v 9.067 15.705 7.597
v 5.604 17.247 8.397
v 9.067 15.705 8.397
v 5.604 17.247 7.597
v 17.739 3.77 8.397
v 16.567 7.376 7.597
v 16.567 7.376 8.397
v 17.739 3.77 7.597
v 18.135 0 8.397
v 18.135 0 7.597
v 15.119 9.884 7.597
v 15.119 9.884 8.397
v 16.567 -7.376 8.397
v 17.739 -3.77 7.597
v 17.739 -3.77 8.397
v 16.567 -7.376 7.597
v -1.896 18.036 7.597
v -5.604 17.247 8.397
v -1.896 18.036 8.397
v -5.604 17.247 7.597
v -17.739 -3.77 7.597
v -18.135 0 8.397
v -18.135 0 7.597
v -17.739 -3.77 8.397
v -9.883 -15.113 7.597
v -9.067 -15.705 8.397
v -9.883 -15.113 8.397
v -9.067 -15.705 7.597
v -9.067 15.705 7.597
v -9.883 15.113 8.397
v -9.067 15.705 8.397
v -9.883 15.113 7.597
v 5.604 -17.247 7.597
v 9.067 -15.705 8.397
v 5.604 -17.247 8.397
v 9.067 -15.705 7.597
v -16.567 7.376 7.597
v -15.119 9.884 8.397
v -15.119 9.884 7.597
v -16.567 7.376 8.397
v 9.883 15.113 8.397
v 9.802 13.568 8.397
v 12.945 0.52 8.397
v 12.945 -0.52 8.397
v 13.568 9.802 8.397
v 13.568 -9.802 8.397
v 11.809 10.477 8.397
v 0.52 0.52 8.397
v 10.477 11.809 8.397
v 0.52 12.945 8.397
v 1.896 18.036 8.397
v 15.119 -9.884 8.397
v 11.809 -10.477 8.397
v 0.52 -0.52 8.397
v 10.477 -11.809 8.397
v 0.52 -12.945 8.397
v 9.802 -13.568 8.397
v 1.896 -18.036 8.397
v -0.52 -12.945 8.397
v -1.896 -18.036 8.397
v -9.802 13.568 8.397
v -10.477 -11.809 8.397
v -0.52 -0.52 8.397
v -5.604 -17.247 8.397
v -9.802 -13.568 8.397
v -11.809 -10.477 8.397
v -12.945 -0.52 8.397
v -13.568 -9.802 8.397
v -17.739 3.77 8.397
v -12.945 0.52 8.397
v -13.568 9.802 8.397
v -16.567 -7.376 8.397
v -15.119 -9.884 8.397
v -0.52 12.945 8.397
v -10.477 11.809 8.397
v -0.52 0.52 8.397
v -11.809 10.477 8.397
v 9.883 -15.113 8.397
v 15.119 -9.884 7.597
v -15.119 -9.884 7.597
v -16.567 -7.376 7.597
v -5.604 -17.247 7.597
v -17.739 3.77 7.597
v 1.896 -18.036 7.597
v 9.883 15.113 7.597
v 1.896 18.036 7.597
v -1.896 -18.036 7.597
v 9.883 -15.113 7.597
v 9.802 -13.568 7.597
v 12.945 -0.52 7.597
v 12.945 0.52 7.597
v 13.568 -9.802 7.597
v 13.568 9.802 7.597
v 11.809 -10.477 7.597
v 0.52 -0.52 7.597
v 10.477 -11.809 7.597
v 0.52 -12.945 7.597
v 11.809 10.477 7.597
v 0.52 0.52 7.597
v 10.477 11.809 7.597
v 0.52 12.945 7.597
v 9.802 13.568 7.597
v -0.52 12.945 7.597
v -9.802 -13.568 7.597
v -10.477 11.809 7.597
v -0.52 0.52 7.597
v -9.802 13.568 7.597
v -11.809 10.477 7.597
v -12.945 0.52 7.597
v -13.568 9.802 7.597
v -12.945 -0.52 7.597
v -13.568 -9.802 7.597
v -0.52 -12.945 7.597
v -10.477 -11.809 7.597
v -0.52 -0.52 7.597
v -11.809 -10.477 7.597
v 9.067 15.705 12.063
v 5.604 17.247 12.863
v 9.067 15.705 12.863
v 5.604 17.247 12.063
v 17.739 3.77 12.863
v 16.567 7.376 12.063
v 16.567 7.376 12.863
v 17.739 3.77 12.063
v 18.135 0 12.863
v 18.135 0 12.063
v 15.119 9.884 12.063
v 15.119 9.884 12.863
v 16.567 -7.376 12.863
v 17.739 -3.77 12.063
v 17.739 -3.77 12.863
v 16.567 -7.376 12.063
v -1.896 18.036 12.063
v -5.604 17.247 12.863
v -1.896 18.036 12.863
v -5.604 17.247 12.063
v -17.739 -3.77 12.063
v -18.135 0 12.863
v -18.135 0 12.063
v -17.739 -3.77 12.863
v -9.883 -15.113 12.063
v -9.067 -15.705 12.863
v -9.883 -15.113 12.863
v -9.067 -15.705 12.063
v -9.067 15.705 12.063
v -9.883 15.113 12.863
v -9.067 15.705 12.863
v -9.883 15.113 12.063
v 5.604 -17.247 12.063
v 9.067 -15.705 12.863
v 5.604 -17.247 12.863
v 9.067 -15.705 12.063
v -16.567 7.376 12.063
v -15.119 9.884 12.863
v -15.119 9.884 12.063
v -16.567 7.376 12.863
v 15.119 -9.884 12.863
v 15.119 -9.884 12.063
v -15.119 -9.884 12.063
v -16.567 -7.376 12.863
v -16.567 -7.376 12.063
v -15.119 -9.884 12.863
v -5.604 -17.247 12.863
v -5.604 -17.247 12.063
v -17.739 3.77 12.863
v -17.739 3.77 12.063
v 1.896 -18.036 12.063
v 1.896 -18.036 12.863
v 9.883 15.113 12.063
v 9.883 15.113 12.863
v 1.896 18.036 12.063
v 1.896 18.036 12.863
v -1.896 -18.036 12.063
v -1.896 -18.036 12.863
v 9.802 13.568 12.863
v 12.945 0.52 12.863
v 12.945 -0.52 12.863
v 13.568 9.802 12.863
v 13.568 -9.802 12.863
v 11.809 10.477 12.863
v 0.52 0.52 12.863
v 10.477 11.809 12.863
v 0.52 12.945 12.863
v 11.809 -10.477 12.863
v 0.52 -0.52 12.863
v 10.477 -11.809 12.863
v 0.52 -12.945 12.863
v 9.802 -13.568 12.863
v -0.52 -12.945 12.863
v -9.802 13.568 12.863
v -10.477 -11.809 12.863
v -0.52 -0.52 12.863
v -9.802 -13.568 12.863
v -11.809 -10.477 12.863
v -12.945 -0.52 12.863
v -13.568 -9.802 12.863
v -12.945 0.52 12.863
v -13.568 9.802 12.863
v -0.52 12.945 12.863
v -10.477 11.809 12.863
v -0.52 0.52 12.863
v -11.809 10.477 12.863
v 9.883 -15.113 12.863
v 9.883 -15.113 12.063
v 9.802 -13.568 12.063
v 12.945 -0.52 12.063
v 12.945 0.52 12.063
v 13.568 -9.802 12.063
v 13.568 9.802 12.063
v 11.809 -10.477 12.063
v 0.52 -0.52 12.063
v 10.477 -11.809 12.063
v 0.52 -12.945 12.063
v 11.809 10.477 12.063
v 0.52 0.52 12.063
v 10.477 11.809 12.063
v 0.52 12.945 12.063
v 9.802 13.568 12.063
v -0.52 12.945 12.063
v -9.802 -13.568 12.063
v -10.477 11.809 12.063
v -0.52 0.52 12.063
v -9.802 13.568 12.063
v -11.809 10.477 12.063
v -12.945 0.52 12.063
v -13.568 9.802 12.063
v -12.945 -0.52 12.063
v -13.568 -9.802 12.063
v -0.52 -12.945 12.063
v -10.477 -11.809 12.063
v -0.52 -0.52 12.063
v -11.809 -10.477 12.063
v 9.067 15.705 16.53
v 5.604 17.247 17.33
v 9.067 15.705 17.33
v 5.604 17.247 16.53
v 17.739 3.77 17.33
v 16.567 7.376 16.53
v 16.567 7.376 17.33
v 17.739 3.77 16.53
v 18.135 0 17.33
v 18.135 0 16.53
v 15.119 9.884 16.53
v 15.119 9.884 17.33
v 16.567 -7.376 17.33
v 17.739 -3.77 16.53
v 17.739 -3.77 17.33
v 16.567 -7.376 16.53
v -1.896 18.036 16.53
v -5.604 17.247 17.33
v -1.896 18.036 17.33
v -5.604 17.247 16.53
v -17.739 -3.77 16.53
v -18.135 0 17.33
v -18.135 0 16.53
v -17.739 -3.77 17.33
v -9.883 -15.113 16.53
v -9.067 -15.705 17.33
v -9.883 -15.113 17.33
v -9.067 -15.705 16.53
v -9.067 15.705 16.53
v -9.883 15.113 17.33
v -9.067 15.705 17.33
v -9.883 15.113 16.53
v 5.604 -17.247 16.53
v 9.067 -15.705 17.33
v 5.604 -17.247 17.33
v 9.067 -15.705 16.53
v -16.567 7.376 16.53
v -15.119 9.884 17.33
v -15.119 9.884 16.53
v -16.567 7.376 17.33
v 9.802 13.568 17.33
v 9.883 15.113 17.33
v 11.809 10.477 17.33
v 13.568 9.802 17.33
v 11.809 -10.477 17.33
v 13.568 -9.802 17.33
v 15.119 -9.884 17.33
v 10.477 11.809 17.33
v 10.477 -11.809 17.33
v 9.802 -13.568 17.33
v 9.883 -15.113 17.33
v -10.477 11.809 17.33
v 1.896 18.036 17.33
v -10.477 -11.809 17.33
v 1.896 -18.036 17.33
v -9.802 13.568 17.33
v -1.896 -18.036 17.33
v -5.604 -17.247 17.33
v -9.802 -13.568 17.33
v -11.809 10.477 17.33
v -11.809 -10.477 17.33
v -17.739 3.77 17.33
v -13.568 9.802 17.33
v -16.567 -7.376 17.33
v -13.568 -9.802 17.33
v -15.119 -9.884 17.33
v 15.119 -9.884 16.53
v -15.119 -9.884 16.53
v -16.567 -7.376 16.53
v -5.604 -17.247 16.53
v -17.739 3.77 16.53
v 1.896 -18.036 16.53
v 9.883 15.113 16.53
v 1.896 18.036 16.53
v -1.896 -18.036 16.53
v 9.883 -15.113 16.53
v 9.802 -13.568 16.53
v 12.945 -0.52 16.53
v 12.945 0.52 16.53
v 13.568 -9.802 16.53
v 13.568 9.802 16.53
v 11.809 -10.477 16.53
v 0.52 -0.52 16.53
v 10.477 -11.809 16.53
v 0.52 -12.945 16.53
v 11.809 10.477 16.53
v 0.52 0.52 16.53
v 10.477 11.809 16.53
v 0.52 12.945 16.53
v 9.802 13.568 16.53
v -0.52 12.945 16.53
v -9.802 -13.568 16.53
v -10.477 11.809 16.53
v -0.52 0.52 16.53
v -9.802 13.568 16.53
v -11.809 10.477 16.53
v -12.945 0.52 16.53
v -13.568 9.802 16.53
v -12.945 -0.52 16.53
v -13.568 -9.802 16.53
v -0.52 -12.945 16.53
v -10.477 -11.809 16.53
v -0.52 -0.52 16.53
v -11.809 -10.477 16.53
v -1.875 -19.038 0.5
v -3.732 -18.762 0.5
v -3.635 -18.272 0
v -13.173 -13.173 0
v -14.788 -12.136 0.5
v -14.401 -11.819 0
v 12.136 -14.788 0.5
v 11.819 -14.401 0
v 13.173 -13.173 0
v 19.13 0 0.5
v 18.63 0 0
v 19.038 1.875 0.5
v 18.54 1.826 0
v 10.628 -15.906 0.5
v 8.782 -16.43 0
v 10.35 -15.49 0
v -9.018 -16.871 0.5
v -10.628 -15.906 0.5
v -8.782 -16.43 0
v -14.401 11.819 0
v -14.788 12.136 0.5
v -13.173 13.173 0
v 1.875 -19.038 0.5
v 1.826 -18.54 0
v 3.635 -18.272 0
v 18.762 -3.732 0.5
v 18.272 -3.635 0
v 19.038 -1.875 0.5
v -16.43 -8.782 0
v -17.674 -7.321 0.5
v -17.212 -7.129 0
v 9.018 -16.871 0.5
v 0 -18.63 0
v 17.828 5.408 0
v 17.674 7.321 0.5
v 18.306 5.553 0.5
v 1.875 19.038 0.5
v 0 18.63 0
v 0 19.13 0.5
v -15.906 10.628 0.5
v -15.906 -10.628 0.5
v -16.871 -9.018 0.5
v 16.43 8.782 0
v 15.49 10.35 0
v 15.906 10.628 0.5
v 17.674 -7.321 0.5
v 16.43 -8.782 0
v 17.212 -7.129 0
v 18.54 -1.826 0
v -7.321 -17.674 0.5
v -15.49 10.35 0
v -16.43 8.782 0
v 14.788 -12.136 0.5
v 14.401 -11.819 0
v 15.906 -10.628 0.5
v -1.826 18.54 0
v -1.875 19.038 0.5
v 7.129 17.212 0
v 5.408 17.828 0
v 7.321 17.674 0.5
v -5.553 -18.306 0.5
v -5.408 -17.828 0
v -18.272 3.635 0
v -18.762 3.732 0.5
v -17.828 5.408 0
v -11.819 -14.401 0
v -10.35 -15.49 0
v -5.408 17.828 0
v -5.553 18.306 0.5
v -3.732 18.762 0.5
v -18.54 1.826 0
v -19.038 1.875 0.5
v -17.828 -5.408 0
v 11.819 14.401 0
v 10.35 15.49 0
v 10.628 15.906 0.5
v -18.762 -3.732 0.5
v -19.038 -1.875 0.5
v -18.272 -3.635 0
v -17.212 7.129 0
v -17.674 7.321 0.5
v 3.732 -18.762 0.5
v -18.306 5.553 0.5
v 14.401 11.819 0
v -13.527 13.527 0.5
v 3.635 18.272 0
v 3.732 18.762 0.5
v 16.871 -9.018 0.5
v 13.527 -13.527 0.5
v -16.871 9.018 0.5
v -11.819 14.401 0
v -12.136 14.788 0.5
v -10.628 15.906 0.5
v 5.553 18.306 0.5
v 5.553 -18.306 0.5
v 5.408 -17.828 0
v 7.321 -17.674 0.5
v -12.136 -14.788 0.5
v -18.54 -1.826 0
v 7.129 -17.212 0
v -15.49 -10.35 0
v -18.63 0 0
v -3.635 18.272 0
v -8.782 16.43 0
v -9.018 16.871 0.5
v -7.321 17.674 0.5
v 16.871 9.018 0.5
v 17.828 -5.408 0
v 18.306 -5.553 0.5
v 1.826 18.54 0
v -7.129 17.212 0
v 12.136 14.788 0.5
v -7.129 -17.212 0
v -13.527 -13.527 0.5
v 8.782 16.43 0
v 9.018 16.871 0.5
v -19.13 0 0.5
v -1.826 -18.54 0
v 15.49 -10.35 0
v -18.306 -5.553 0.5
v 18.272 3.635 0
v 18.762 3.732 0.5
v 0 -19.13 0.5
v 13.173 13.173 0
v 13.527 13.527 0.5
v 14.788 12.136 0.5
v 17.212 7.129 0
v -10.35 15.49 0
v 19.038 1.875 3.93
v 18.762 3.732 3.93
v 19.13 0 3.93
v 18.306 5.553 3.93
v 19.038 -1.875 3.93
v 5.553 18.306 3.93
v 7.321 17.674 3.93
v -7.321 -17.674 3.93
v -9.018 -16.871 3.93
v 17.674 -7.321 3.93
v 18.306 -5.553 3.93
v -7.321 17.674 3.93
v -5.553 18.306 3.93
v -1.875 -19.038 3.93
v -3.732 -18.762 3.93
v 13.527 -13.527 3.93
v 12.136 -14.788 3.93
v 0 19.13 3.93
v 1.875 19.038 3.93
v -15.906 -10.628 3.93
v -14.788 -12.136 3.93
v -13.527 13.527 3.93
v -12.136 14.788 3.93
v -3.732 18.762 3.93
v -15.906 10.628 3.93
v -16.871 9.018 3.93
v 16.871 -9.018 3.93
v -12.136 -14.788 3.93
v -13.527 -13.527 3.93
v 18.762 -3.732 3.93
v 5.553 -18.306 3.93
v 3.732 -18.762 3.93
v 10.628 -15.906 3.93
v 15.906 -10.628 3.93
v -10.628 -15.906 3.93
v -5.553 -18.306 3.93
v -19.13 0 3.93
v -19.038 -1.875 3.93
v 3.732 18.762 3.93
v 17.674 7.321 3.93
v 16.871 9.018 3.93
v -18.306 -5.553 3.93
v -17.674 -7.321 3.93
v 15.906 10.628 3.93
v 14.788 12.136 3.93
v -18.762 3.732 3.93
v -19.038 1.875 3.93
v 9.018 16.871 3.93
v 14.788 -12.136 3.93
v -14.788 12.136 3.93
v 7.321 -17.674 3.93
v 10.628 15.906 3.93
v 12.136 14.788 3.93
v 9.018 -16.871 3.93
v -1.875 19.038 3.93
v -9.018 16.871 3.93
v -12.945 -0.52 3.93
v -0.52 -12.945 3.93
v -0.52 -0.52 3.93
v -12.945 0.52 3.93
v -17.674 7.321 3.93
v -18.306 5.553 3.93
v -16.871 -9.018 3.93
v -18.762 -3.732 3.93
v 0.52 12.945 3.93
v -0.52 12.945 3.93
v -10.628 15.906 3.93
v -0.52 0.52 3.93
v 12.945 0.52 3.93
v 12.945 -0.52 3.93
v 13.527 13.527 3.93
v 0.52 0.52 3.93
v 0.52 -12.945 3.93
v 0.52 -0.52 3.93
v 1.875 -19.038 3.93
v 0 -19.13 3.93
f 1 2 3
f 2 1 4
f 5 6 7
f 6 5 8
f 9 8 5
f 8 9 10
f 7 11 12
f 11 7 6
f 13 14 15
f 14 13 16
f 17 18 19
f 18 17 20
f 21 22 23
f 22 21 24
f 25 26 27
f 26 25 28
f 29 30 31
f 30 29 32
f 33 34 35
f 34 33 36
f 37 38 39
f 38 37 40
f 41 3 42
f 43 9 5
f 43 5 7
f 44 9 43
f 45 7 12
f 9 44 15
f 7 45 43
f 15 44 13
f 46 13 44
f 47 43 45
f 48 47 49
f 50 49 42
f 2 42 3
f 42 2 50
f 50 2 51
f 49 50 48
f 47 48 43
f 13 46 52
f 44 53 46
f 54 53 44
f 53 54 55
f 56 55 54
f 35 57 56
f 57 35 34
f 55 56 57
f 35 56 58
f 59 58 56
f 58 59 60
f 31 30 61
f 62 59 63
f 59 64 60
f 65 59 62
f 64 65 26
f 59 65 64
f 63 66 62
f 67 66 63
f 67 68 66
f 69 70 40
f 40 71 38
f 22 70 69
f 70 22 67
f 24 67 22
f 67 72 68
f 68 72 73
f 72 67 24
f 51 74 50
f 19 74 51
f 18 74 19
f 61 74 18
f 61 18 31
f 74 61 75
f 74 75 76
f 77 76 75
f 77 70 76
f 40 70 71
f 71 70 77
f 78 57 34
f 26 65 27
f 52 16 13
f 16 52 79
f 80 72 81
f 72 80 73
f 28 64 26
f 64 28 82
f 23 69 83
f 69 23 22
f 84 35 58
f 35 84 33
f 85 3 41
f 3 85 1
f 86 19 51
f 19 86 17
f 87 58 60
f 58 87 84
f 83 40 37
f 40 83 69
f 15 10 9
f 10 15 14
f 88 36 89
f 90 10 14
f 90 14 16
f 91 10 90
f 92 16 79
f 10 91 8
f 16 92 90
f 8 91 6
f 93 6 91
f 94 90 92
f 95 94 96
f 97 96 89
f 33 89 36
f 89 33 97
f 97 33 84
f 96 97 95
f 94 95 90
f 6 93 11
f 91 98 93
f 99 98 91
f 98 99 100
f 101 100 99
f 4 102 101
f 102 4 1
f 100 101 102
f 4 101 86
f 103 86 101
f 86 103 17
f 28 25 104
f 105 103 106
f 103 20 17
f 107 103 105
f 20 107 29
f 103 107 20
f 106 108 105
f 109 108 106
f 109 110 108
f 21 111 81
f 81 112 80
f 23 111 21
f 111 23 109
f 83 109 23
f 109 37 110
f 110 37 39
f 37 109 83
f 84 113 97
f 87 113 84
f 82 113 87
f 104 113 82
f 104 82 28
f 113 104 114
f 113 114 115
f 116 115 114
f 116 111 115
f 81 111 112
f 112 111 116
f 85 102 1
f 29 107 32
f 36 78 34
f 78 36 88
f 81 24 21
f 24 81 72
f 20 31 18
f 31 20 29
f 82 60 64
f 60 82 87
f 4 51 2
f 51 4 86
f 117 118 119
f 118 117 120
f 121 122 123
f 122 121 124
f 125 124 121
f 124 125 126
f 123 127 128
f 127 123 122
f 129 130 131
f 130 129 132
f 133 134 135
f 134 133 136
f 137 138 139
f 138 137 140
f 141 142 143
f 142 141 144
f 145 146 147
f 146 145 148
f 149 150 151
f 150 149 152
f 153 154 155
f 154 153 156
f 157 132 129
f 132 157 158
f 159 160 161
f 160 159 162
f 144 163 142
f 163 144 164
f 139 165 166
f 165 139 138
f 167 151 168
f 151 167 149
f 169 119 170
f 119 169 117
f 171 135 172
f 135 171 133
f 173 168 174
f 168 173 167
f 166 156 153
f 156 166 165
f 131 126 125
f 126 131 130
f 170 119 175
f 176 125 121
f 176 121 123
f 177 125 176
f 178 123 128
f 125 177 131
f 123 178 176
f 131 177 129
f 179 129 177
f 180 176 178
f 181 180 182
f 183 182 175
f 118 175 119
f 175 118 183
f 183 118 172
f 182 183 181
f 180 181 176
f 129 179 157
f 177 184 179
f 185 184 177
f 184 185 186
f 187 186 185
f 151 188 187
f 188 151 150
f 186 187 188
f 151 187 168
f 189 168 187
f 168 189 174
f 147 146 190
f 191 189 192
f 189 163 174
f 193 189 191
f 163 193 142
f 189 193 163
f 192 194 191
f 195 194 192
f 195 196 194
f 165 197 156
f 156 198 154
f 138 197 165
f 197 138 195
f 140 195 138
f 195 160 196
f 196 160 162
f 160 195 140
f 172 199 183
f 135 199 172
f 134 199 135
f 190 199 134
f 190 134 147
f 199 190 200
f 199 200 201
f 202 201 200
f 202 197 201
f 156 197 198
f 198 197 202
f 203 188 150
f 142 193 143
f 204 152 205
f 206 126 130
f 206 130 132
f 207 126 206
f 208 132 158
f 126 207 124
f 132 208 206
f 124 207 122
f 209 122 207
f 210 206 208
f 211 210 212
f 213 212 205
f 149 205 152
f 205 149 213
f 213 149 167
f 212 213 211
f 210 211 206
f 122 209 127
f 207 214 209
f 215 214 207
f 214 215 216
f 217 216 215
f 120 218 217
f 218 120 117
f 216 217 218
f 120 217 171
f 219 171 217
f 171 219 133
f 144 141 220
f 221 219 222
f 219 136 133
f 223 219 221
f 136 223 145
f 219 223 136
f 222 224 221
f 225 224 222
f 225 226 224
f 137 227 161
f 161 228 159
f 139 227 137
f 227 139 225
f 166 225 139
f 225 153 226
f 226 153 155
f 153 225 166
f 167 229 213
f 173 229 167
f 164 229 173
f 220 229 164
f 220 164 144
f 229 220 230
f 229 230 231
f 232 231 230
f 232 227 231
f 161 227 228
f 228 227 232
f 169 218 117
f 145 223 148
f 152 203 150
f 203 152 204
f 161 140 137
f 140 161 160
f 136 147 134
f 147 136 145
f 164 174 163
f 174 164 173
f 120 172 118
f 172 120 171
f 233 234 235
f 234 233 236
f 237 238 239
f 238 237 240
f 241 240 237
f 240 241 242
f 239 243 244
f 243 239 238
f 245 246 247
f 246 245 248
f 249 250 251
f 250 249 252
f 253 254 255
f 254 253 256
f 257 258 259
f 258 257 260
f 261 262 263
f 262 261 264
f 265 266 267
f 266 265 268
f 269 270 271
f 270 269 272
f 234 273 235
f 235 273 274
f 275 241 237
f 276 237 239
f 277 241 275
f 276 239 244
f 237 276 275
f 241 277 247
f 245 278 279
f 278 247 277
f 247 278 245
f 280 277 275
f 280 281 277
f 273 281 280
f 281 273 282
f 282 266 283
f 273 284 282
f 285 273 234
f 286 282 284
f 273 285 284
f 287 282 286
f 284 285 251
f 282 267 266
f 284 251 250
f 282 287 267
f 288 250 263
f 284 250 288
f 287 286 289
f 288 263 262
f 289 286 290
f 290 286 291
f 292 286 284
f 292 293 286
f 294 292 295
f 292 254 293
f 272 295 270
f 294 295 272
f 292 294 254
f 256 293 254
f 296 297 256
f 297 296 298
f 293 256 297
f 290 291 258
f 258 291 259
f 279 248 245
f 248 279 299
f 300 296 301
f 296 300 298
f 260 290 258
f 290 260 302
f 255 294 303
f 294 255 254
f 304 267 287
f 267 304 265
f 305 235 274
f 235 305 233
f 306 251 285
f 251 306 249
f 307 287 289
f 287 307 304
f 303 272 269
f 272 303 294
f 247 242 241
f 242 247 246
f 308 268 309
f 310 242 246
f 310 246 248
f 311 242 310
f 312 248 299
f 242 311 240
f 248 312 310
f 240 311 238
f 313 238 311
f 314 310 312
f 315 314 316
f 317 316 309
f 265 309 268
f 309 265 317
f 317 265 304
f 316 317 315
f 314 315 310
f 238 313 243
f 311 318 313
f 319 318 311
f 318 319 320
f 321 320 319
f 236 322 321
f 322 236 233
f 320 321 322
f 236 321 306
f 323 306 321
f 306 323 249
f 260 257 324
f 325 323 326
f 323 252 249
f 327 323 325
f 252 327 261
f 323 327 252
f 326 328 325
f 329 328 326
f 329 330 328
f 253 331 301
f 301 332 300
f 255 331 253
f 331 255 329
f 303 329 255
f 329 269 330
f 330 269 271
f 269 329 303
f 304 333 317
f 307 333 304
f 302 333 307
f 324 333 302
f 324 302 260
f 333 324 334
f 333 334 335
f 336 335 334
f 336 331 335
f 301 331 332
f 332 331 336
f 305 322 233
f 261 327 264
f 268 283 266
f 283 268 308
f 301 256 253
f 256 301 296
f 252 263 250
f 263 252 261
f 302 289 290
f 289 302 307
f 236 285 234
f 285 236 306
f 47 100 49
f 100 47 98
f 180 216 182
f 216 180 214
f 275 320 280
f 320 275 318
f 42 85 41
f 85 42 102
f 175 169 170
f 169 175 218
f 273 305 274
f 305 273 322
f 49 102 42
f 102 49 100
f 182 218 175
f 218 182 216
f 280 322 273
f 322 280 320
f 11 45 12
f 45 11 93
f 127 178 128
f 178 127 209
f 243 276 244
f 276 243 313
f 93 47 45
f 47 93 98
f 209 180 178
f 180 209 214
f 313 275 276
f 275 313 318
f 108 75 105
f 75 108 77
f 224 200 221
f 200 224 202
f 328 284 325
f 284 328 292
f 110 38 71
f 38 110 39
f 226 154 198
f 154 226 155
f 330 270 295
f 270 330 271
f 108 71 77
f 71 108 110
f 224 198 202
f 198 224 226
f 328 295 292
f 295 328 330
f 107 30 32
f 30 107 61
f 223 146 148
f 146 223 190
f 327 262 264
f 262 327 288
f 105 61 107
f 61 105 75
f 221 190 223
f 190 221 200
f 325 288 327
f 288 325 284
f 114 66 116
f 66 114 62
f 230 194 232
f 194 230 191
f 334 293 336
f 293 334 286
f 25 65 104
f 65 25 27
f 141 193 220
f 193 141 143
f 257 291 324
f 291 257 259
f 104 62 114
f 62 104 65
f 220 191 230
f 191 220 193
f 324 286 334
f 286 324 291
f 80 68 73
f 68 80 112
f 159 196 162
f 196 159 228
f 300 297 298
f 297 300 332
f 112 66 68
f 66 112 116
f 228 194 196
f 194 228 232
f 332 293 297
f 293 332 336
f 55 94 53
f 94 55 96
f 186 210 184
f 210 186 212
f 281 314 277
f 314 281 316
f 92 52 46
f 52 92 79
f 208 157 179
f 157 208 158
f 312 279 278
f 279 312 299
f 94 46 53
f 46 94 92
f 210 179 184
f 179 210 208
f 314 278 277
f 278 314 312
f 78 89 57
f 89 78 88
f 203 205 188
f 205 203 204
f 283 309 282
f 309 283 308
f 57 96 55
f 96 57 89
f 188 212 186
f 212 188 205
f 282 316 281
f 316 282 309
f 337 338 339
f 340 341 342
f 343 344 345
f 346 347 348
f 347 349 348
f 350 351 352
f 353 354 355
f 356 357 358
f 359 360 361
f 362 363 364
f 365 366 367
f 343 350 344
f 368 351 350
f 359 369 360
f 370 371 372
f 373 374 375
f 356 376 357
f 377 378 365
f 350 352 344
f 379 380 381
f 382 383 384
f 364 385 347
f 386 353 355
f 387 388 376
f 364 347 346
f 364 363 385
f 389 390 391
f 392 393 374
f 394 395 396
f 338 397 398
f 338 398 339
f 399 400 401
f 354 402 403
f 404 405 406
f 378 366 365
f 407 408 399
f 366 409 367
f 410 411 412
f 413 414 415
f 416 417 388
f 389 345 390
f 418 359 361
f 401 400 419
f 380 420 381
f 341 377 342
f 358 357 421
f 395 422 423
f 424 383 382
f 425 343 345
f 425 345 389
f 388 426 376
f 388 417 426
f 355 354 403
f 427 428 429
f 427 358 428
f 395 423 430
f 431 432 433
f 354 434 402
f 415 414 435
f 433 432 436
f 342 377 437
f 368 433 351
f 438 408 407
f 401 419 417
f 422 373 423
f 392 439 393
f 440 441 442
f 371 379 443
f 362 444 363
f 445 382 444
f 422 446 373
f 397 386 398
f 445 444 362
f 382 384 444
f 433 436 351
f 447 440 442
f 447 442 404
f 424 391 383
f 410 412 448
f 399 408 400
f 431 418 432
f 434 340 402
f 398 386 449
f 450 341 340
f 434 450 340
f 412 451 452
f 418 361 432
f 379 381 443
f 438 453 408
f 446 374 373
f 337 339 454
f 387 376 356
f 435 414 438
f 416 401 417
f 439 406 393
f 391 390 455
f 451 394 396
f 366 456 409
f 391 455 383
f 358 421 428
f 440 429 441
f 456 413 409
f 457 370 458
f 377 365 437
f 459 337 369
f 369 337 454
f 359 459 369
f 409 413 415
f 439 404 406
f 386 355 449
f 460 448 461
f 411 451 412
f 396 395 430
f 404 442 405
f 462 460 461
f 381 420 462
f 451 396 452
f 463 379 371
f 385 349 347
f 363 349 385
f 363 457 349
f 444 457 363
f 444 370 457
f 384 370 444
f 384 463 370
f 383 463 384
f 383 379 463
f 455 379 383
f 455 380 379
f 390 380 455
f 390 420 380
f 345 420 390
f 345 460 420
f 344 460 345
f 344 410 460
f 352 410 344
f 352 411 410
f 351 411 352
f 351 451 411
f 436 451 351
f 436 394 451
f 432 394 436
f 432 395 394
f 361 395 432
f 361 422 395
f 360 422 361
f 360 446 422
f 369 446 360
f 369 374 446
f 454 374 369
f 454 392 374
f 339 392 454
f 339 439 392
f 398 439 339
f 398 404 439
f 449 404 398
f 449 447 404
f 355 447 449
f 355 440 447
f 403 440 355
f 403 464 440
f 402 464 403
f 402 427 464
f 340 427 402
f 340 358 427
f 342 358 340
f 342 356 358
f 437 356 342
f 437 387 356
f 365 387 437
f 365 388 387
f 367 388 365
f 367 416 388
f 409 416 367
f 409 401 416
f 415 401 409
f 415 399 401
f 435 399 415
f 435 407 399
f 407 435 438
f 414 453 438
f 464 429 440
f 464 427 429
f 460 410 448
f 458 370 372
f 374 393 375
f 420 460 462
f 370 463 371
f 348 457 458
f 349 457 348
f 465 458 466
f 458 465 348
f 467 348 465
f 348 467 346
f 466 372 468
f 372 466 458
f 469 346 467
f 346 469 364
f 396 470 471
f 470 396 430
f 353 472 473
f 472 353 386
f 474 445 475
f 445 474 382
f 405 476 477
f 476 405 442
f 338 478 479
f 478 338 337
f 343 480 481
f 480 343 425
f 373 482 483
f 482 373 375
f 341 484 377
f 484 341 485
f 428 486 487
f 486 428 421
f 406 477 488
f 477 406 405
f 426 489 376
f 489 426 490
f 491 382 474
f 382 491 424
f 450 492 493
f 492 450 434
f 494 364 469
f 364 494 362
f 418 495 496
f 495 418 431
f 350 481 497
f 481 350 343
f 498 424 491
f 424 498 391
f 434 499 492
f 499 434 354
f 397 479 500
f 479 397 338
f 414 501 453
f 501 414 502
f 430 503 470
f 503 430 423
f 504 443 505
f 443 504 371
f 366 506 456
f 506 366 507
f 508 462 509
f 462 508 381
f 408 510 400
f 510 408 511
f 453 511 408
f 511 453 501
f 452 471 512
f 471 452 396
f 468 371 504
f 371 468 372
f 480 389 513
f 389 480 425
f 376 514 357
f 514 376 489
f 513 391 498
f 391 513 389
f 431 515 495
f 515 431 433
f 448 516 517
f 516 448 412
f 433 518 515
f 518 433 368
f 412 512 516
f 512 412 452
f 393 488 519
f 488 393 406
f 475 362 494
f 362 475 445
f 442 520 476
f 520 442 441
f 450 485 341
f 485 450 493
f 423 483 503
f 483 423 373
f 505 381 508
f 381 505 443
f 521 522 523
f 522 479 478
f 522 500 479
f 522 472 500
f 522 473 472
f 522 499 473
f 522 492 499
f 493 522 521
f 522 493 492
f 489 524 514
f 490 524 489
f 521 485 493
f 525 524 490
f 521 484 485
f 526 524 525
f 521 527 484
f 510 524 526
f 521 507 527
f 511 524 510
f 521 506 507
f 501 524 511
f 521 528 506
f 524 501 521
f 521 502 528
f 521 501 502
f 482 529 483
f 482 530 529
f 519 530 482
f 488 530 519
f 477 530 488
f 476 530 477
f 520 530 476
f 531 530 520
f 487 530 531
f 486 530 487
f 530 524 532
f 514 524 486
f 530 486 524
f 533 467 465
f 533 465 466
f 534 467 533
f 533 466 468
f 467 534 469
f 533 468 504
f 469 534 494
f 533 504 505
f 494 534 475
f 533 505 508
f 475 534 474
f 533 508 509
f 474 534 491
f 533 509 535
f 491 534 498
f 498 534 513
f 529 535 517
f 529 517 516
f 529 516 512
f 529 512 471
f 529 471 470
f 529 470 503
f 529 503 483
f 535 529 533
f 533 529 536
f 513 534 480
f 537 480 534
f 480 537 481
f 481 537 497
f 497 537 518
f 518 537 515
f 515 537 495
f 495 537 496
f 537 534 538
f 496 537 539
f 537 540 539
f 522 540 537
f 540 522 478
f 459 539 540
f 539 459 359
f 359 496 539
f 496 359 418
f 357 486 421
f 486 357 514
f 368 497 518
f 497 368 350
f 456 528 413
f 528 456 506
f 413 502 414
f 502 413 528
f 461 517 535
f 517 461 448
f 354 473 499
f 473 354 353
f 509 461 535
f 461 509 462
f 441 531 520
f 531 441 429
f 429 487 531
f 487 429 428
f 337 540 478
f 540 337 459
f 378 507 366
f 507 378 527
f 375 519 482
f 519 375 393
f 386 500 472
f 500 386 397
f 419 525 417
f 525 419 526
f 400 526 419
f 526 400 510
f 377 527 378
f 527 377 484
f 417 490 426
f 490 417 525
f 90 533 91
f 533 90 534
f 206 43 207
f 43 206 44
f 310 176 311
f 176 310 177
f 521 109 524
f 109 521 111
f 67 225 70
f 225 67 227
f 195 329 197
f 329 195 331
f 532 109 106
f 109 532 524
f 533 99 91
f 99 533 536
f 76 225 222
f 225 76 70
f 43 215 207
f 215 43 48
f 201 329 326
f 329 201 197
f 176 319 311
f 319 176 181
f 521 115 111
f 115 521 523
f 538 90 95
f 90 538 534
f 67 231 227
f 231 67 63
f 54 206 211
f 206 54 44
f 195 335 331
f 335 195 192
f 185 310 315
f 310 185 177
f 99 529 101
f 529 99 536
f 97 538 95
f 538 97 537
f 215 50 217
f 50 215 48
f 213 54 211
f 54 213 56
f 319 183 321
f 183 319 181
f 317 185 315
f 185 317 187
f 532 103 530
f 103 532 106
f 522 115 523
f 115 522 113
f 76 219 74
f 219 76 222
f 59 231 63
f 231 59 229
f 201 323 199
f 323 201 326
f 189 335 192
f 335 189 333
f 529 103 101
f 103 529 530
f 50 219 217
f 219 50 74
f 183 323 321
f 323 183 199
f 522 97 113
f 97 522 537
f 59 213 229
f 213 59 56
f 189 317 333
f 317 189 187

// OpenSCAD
/* [MAIN] */

// outside diameter of the pipe
od=38.26;

// This is the diameter of the fins.  Make this sligtly larger than the inside diameter of the pipe
fin_dia=36.27;

// How thick the fin layers are.
layer_thickness=0.8;

// The number of fin layers
num_layers=3;

// The height of the entire foot INCLUDING the part that goes inside the pipe.
total_h=17.33;

// The height of the bottom pad of the foot
pad_h=3.93;

// Diameter of the x-shaped center support
x_dia=25.89;

// Thickness of the x-shaped center support
x_thick=1.04;

// Diameter of the circular cutouts
circ_dia=9.06;

// How many circular cutouts
num_circ=4;

// How far from the center to the edge of the circular cutouts
center_to_circ_edge=15.66;

// How big a bevel to add to the bottom of the foot
bevel_h=0.5;

// if true, will cut in half and flip sideways for printing
printable=0; // [0:false,1:true]

module foot(){
	// calc
	layers_h=total_h-pad_h;
	layer_spacing=layers_h/(num_layers+0);

	// pad
	cylinder(r2=od/2,r1=od/2-bevel_h,h=bevel_h,$fn=64);
	translate([0,0,bevel_h]) cylinder(r=od/2,h=pad_h-bevel_h,$fn=64);
	// layers
	difference(){
		union(){
			// layers
			for(z=[pad_h+layer_spacing-layer_thickness:layer_spacing:total_h]){
				translate([0,0,z]) cylinder(r=fin_dia/2,h=layer_thickness);
			}
		}
		for(a=[0:360/num_circ:359.99]){
			rotate([0,0,a+45]) translate([center_to_circ_edge+circ_dia/2,0,pad_h]) cylinder(r=circ_dia/2,h=total_h);
		}
	}
	// x
	translate([-x_dia/2,-x_thick/2,0]) cube([x_dia,x_thick,total_h]);
	translate([-x_thick/2,-x_dia/2,0]) cube([x_thick,x_dia,total_h]);
}
	
if(printable==1){
	difference(){
		union(){
			translate([1,0,0]) rotate([0,90,0]) foot();
			translate([-1,0,0]) rotate([0,-90,0]) foot();
		}
		translate([-total_h*1.5,-od,-od]) cube([total_h*3,od*2,od]);
	}
}else{
	foot();
}
